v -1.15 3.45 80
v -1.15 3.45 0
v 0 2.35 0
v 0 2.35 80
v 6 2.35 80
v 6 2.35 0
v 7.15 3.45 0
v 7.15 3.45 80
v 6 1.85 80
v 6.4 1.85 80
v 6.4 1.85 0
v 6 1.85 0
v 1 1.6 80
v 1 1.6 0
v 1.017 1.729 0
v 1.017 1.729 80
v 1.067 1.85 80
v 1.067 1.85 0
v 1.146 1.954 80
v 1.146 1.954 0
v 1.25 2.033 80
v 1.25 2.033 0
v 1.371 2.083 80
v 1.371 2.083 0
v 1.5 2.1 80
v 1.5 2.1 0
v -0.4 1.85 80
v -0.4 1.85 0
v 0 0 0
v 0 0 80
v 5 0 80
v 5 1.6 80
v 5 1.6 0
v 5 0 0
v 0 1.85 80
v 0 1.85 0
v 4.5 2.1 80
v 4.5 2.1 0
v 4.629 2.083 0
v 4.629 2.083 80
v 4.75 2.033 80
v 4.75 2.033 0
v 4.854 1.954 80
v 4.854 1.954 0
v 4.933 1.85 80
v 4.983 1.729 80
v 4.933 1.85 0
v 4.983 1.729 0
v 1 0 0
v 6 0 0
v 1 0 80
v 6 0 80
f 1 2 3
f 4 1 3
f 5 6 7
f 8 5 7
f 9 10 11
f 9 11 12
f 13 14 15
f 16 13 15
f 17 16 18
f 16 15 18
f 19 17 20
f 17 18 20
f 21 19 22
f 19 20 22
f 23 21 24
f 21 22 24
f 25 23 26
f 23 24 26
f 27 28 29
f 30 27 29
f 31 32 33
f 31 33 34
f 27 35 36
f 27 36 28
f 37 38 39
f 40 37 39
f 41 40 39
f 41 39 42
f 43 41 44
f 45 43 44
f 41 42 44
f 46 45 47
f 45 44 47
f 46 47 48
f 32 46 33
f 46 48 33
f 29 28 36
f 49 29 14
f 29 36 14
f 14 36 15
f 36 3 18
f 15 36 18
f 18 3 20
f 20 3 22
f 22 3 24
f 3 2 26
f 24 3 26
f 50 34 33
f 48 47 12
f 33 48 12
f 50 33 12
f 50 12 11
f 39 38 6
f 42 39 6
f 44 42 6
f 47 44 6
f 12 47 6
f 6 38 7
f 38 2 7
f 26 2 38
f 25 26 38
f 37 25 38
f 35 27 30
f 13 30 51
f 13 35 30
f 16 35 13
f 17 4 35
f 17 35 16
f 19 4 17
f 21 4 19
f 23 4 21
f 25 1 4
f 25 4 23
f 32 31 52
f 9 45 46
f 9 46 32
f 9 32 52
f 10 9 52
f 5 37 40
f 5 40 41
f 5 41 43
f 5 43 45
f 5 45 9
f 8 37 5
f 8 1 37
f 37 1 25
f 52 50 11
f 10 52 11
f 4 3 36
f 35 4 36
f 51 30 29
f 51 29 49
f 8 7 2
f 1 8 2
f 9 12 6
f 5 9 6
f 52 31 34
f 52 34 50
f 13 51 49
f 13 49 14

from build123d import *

# Parameters (mm, degrees)
BOSS_EXTRUDE1_DEPTH = 80


with BuildPart() as part:
    # Sketch1 → Boss-Extrude1 (new body)
    with BuildSketch(Plane.XY):
        with BuildLine():
            Line((6, 0), (6.4, 1.85))
            Line((6.4, 1.85), (6, 1.85))
            Line((6, 1.85), (6, 2.35))
            Line((6, 2.35), (7.15, 3.45))
            Line((7.15, 3.45), (6, 3.45))
            Line((6, 3.45), (0, 3.45))
            Line((0, 3.45), (-1.15, 3.45))
            Line((-1.15, 3.45), (0, 2.35))
            Line((0, 2.35), (0, 1.85))
            Line((0, 1.85), (-0.4, 1.85))
            Line((-0.4, 1.85), (0, 0))
            Line((0, 0), (1, 0))
            Line((1, 0), (1, 1.6))
            ThreePointArc((1, 1.6), (1.146446609, 1.953553391), (1.5, 2.1))
            Line((1.5, 2.1), (4.5, 2.1))
            ThreePointArc((4.5, 2.1), (4.853553391, 1.953553391), (5, 1.6))
            Line((5, 1.6), (5, 0))
            Line((5, 0), (6, 0))
        make_face()
    extrude(amount=BOSS_EXTRUDE1_DEPTH)


solid = part.part
